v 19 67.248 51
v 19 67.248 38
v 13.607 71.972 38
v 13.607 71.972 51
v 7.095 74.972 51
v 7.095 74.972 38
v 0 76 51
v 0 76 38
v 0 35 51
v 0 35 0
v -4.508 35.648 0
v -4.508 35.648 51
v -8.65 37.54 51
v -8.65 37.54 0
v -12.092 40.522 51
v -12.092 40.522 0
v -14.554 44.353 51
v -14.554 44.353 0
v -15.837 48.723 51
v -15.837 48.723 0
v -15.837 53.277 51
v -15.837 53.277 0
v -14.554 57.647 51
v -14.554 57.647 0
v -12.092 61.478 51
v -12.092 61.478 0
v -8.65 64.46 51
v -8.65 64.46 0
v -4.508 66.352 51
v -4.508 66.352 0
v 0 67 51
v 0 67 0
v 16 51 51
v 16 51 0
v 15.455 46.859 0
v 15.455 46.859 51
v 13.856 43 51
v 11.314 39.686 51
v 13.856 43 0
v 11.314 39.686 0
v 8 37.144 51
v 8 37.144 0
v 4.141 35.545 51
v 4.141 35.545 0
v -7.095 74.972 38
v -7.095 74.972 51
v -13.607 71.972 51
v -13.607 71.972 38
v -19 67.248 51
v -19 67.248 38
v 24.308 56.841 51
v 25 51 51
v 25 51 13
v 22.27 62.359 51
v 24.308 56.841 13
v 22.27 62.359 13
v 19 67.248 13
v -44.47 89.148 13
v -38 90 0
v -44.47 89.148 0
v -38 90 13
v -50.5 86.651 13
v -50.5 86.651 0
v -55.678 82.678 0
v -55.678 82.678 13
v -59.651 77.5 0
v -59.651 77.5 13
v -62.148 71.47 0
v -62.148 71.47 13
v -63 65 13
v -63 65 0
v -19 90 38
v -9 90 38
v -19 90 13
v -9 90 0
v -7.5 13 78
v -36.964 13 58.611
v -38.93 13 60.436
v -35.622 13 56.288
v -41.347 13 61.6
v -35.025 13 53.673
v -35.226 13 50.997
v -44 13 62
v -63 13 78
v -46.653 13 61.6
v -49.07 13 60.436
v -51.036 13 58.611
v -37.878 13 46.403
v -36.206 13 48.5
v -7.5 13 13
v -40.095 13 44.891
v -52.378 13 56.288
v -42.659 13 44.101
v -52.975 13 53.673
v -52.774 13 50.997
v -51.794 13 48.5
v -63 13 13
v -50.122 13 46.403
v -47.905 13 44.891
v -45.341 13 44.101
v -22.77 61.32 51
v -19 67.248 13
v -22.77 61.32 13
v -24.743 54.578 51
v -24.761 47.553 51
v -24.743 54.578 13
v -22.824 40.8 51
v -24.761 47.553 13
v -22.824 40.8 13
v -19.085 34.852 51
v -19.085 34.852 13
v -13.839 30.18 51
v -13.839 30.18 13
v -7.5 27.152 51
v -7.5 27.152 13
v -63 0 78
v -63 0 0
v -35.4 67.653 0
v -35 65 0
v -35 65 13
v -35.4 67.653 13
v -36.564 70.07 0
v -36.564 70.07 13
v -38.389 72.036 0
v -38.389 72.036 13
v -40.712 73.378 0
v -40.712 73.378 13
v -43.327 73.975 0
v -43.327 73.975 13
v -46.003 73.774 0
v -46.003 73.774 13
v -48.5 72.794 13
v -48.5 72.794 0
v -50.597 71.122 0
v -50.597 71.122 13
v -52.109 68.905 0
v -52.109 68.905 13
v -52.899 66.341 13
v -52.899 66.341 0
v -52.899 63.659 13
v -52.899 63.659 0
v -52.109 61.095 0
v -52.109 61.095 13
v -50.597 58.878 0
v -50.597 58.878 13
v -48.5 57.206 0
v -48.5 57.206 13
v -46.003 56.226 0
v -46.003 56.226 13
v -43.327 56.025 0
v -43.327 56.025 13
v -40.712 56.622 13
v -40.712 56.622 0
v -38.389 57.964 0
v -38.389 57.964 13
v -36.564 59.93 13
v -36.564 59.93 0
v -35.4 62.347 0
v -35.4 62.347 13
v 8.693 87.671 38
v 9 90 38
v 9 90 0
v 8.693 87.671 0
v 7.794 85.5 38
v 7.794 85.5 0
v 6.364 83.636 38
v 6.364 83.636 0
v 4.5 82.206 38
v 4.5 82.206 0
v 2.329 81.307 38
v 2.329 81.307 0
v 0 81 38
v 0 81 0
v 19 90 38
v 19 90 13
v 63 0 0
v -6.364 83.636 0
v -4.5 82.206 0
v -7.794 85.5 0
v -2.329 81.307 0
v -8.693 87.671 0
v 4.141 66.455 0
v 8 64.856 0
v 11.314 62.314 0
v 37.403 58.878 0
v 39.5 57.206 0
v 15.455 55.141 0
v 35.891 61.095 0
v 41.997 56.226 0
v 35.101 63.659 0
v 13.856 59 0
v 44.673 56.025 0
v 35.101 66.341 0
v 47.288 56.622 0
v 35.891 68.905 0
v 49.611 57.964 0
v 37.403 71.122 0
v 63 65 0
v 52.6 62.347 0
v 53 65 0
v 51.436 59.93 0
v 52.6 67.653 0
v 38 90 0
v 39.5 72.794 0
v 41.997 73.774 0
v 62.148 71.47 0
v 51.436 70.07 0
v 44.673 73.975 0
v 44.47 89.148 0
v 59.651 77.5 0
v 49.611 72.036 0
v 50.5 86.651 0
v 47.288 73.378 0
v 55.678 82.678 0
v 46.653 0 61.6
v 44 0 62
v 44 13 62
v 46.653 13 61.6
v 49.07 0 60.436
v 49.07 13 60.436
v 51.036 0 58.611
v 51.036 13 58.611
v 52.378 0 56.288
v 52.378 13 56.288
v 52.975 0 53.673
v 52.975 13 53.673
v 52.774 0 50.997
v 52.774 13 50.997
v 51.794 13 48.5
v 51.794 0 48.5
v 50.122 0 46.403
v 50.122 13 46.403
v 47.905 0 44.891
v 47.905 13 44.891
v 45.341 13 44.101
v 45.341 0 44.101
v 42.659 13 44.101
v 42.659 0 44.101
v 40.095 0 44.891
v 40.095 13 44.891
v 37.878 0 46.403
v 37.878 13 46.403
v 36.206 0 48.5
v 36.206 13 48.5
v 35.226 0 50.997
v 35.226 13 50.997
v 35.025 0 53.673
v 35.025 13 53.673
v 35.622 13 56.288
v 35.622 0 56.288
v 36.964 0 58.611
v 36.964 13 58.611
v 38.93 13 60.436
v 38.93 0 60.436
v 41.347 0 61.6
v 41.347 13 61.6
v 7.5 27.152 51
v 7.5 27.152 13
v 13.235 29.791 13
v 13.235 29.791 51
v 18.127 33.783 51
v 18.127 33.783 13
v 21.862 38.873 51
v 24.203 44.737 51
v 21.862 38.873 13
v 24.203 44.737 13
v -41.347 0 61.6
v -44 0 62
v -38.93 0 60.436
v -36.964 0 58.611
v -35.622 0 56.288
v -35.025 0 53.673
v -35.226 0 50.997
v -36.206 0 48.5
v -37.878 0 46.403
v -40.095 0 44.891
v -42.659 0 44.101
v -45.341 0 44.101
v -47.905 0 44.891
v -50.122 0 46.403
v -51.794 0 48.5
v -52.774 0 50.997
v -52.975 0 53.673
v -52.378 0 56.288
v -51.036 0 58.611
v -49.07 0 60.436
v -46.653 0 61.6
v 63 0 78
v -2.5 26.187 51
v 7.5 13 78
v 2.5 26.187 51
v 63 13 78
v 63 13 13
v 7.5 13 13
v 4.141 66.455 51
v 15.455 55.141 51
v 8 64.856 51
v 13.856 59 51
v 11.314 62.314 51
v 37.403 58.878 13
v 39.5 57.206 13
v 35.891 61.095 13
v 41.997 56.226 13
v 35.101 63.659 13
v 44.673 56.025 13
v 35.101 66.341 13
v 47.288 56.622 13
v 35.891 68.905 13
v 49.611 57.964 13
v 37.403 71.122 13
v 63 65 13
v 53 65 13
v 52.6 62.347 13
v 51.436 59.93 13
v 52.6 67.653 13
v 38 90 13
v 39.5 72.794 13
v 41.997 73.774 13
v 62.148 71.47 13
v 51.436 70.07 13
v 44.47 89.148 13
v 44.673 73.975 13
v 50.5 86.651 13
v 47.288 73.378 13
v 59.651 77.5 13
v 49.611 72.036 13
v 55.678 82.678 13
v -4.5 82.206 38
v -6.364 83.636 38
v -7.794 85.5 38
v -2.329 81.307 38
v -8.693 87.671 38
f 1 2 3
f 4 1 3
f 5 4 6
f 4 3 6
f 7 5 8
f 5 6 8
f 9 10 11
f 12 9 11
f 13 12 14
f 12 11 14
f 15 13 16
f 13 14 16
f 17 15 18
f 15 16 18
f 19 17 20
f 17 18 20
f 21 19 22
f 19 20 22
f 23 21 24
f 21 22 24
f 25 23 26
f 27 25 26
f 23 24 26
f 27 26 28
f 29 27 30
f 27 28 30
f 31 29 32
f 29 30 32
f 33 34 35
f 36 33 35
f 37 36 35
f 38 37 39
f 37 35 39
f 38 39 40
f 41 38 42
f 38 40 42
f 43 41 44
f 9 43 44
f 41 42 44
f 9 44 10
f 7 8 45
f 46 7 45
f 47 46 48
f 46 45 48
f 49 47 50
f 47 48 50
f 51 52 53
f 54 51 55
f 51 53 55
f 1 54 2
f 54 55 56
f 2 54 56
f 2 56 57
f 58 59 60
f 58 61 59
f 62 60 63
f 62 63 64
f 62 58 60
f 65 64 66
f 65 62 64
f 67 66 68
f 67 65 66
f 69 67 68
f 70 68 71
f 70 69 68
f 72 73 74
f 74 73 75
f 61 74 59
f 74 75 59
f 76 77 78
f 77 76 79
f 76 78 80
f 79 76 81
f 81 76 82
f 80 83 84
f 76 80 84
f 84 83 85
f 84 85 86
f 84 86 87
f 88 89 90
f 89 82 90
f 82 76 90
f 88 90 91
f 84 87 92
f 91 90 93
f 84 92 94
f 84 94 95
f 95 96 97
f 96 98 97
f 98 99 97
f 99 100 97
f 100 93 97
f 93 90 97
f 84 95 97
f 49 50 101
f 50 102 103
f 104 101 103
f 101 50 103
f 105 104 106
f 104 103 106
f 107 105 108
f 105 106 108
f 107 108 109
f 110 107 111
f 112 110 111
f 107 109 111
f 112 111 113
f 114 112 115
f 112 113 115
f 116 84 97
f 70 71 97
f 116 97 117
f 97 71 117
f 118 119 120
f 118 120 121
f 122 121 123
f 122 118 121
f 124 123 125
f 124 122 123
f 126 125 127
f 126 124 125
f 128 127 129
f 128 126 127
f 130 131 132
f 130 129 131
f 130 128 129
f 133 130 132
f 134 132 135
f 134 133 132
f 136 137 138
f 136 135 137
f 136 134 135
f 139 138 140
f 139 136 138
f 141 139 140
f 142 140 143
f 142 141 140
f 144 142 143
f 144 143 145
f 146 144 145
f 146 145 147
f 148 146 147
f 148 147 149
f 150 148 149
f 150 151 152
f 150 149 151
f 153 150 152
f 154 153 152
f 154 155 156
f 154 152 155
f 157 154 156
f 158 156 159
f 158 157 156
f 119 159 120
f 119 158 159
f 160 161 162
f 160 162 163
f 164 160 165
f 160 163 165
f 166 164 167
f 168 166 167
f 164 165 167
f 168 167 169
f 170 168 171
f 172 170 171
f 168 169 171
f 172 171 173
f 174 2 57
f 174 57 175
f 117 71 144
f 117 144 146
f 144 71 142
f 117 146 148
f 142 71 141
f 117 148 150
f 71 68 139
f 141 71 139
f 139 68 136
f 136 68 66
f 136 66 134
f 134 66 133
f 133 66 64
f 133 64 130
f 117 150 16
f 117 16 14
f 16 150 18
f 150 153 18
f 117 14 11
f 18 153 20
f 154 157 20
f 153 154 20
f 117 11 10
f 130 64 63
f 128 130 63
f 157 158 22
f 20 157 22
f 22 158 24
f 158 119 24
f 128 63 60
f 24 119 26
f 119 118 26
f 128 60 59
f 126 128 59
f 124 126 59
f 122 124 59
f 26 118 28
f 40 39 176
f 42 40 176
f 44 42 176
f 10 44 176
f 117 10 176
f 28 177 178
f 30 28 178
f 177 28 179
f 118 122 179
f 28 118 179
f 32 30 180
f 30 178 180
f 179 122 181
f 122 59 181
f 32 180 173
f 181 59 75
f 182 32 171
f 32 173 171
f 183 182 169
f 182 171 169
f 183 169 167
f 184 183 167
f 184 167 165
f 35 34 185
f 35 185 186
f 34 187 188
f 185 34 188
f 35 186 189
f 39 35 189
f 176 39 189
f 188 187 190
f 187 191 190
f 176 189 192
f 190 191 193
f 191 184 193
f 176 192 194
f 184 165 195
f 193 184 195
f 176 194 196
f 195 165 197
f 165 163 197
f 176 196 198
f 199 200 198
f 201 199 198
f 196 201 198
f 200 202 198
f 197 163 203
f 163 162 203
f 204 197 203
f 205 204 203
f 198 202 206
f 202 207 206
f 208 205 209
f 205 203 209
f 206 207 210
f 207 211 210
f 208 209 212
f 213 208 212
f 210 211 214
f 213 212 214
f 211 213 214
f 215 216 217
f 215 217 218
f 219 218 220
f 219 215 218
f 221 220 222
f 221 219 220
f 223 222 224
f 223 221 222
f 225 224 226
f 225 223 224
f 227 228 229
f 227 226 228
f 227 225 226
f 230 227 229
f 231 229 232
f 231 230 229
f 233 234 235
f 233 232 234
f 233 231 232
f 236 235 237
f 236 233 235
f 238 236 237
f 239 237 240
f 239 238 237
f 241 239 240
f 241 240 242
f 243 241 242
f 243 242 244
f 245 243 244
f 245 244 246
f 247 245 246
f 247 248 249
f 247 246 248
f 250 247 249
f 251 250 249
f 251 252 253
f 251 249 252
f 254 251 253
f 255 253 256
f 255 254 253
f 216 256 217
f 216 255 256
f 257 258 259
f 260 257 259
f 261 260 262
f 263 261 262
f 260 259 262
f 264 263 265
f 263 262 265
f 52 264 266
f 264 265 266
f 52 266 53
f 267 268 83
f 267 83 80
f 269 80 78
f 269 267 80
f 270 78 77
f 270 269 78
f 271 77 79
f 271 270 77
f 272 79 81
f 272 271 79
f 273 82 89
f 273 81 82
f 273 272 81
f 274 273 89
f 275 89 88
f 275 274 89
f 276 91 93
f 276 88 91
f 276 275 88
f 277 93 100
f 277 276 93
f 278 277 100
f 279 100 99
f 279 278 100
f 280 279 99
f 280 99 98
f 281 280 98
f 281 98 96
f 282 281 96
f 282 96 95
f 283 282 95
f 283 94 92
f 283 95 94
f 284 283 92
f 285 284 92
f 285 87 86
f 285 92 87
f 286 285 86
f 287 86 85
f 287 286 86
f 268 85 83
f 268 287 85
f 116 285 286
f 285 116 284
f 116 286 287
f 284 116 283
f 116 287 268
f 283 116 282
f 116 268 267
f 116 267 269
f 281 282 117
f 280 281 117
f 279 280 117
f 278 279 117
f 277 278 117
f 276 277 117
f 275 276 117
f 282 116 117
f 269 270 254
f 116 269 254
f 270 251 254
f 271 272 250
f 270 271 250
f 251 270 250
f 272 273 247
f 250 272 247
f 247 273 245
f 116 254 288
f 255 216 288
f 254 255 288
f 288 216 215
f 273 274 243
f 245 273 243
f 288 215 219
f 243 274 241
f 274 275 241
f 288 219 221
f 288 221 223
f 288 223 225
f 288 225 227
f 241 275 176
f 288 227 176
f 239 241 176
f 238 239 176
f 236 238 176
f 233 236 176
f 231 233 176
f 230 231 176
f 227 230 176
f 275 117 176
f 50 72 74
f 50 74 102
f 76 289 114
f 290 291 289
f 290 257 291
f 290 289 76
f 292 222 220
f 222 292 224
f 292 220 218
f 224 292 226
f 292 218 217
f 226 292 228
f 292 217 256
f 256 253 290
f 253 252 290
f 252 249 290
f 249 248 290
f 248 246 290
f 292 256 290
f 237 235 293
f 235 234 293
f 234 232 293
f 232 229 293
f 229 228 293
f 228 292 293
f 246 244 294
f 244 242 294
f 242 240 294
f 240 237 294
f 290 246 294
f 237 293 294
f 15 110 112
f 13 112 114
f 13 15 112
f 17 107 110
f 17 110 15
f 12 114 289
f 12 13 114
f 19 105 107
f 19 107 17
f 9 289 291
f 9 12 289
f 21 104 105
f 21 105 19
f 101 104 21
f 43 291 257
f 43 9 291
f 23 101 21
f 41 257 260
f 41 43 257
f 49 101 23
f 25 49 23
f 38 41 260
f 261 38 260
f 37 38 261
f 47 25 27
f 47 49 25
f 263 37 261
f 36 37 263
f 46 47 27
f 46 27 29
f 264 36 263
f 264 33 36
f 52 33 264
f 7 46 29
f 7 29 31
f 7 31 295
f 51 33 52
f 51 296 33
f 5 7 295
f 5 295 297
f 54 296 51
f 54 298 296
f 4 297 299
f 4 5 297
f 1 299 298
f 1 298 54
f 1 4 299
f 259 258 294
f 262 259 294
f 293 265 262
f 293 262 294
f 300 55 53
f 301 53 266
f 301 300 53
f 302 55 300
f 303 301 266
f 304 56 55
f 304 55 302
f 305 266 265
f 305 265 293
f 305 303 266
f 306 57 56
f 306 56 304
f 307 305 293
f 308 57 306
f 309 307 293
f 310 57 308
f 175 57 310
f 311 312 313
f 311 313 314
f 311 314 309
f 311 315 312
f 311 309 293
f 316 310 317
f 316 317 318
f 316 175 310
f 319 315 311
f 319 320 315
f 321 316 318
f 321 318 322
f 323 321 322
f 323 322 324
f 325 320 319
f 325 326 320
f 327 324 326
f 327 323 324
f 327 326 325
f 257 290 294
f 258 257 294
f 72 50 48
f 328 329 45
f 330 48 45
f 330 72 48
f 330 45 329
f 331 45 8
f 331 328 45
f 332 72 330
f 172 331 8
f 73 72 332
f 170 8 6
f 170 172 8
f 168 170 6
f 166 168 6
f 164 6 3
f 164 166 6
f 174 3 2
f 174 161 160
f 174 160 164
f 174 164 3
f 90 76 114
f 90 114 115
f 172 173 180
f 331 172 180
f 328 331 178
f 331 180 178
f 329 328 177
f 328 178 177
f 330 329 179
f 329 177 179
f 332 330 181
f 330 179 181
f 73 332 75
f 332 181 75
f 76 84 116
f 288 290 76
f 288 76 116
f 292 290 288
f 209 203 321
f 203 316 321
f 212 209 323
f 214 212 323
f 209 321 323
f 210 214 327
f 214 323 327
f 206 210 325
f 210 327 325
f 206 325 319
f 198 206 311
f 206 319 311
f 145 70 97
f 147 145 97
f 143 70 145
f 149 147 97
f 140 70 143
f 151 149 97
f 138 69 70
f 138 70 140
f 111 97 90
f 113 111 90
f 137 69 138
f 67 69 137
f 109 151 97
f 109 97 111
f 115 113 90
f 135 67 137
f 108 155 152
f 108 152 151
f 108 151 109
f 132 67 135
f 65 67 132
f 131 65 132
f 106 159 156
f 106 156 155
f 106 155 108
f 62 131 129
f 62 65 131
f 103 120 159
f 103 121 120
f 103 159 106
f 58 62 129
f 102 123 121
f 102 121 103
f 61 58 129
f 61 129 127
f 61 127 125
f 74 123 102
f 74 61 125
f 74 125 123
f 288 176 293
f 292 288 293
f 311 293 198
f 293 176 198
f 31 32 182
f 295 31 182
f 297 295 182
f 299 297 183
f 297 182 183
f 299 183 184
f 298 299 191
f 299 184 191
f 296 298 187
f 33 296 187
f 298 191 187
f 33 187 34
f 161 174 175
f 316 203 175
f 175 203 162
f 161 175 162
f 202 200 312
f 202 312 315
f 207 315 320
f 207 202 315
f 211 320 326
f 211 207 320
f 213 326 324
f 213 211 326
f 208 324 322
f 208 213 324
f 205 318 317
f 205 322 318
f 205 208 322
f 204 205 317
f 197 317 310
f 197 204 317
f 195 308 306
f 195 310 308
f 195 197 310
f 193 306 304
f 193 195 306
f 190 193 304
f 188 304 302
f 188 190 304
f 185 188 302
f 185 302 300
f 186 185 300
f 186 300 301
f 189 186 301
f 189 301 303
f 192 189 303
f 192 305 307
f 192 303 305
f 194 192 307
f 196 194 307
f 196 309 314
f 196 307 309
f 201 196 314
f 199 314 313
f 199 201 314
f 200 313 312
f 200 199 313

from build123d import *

# Parameters (mm, degrees)
SKETCH1_W               = 63
SKETCH1_H               = 13
BOSS_EXTRUDE1_DEPTH     = 78
BOSS_EXTRUDE2_DEPTH     = 51
BOSS_EXTRUDE3_DEPTH     = 13
BOSS_EXTRUDE5_DEPTH     = 38
FILLET1_R               = 25
CUT_EXTRUDE1_DEPTH      = 135.733069437
CUT_EXTRUDE1_DEPTH_BACK = 135.733069437
SKETCH3_R               = 9
CUT_EXTRUDE2_DEPTH      = 135.733069437
CUT_EXTRUDE2_DEPTH_BACK = 135.733069437
SKETCH2_R               = 9


with BuildPart() as part:
    # Sketch1 → Boss-Extrude1 (new body)
    with BuildSketch(Plane.XY):
        with Locations((-31.5, 6.5)):
            Rectangle(SKETCH1_W, SKETCH1_H)
        with Locations((31.5, 6.5)):
            Rectangle(SKETCH1_W, SKETCH1_H)
    extrude(amount=BOSS_EXTRUDE1_DEPTH)



with BuildPart() as body_2:
    # Sketch1<3> → Boss-Extrude2 (new body)
    with BuildSketch(Plane.XY):
        with BuildLine():
            ThreePointArc((-19, 67.248076809), (-22.706848309, 40.540600405), (0, 26))
            Line((0, 26), (0, 35))
            ThreePointArc((0, 35), (-16, 51), (0, 67))
            Line((0, 67), (0, 76))
            ThreePointArc((0, 76), (-10.459399595, 73.706848309), (-19, 67.248076809))
        make_face()
        with BuildLine():
            Line((0, 35), (0, 26))
            ThreePointArc((0, 26), (17.67766953, 33.32233047), (25, 51))
            ThreePointArc((25, 51), (23.452078799, 59.660254038), (19, 67.248076809))
            ThreePointArc((19, 67.248076809), (10.459399595, 73.706848309), (0, 76))
            Line((0, 76), (0, 67))
            ThreePointArc((0, 67), (11.313708499, 62.313708499), (16, 51))
            ThreePointArc((16, 51), (11.313708499, 39.686291501), (0, 35))
        make_face()
    extrude(amount=BOSS_EXTRUDE2_DEPTH)


with BuildPart() as part_1:
    add(part.part)

    add(body_2.part)  # Boss-Extrude3 merges body 2
    # Sketch1<5> → Boss-Extrude3 (add)
    with BuildSketch(Plane.XY):
        with BuildLine():
            Line((0, 13), (63, 13))
            Line((63, 13), (63, 90))
            Line((63, 90), (19, 90))
            Line((19, 90), (19, 67.248076809))
            ThreePointArc((19, 67.248076809), (23.452078799, 59.660254038), (25, 51))
            ThreePointArc((25, 51), (17.67766953, 33.32233047), (0, 26))
            Line((0, 26), (0, 13))
        make_face()
        with BuildLine():
            Line((-63, 13), (0, 13))
            Line((0, 13), (0, 26))
            ThreePointArc((0, 26), (-22.706848309, 40.540600405), (-19, 67.248076809))
            Line((-19, 67.248076809), (-19, 90))
            Line((-19, 90), (-63, 90))
            Line((-63, 90), (-63, 13))
        make_face()
    extrude(amount=BOSS_EXTRUDE3_DEPTH)

    # Sketch1<7> → Boss-Extrude5 (add)
    with BuildSketch(Plane.XY):
        with BuildLine():
            Line((-19, 90), (-19, 67.248076809))
            ThreePointArc((-19, 67.248076809), (-10.459399595, 73.706848309), (0, 76))
            Line((0, 76), (0, 81))
            ThreePointArc((0, 81), (-6.363961031, 83.636038969), (-9, 90))
            Line((-9, 90), (-19, 90))
        make_face()
        with BuildLine():
            Line((19, 67.248076809), (19, 90))
            Line((19, 90), (9, 90))
            ThreePointArc((9, 90), (6.363961031, 83.636038969), (0, 81))
            Line((0, 81), (0, 76))
            ThreePointArc((0, 76), (10.459399595, 73.706848309), (19, 67.248076809))
        make_face()
    extrude(amount=BOSS_EXTRUDE5_DEPTH)

    # Fillet1
    fillet1_edges = [part_1.edges().sort_by_distance(p)[0] for p in [
        (-63, 90, 6.5),
        (63, 90, 6.5),
    ]]
    fillet(fillet1_edges, radius=FILLET1_R)

    # Sketch3 → Cut-Extrude1 (cut, two sides: drawn at the far end of the back side and taken through both)
    with BuildSketch(Plane(origin=(0, 0, 0), x_dir=(1, 0, 0), z_dir=(0, 1, 0)).offset(-CUT_EXTRUDE1_DEPTH_BACK)):
        with Locations(Location((-44, -53, 0), (0, 0, 270))):
            Circle(SKETCH3_R)
        with Locations(Location((44, -53, 0), (0, 0, 270))):
            Circle(SKETCH3_R)
    extrude(amount=CUT_EXTRUDE1_DEPTH + CUT_EXTRUDE1_DEPTH_BACK, mode=Mode.SUBTRACT)

    # Sketch2 → Cut-Extrude2 (cut, two sides: drawn at the far end of the back side and taken through both)
    with BuildSketch(Plane.XY.offset(-CUT_EXTRUDE2_DEPTH_BACK)):
        with Locations((-44, 65)):
            Circle(SKETCH2_R)
        with Locations((44, 65)):
            Circle(SKETCH2_R)
    extrude(amount=CUT_EXTRUDE2_DEPTH + CUT_EXTRUDE2_DEPTH_BACK, mode=Mode.SUBTRACT)

    # Sketch13 → Loft1 section 0
    with BuildSketch(Plane(origin=(-7.5, 0, 0), x_dir=(0, 0, -1), z_dir=(1, 0, 0))):
        with BuildLine():
            Line((-78, 13), (-13, 13))
            Line((-13, 13), (-13, 27.151519965))
            Line((-13, 27.151519965), (-51, 27.151519965))
            Line((-51, 27.151519965), (-78, 13))
        make_face()
    # Sketch5 → Loft1 section 1
    with BuildSketch(Plane(origin=(0, 0, 0), x_dir=(0, 0, -1), z_dir=(1, 0, 0))):
        with BuildLine():
            Line((-78, 13), (-51, 26.066063348))
            Line((-51, 26.066063348), (-13, 26))
            Line((-13, 26), (-13, 13))
            Line((-13, 13), (-78, 13))
        make_face()
    # Sketch12 → Loft1 section 2
    with BuildSketch(Plane(origin=(7.5, 0, 0), x_dir=(0, 0, -1), z_dir=(1, 0, 0))):
        with BuildLine():
            Line((-51, 27.151519965), (-78, 13))
            Line((-78, 13), (-13, 13))
            Line((-13, 13), (-13, 27.151519965))
            Line((-13, 27.151519965), (-51, 27.151519965))
        make_face()
    loft()


solid = part_1.part
